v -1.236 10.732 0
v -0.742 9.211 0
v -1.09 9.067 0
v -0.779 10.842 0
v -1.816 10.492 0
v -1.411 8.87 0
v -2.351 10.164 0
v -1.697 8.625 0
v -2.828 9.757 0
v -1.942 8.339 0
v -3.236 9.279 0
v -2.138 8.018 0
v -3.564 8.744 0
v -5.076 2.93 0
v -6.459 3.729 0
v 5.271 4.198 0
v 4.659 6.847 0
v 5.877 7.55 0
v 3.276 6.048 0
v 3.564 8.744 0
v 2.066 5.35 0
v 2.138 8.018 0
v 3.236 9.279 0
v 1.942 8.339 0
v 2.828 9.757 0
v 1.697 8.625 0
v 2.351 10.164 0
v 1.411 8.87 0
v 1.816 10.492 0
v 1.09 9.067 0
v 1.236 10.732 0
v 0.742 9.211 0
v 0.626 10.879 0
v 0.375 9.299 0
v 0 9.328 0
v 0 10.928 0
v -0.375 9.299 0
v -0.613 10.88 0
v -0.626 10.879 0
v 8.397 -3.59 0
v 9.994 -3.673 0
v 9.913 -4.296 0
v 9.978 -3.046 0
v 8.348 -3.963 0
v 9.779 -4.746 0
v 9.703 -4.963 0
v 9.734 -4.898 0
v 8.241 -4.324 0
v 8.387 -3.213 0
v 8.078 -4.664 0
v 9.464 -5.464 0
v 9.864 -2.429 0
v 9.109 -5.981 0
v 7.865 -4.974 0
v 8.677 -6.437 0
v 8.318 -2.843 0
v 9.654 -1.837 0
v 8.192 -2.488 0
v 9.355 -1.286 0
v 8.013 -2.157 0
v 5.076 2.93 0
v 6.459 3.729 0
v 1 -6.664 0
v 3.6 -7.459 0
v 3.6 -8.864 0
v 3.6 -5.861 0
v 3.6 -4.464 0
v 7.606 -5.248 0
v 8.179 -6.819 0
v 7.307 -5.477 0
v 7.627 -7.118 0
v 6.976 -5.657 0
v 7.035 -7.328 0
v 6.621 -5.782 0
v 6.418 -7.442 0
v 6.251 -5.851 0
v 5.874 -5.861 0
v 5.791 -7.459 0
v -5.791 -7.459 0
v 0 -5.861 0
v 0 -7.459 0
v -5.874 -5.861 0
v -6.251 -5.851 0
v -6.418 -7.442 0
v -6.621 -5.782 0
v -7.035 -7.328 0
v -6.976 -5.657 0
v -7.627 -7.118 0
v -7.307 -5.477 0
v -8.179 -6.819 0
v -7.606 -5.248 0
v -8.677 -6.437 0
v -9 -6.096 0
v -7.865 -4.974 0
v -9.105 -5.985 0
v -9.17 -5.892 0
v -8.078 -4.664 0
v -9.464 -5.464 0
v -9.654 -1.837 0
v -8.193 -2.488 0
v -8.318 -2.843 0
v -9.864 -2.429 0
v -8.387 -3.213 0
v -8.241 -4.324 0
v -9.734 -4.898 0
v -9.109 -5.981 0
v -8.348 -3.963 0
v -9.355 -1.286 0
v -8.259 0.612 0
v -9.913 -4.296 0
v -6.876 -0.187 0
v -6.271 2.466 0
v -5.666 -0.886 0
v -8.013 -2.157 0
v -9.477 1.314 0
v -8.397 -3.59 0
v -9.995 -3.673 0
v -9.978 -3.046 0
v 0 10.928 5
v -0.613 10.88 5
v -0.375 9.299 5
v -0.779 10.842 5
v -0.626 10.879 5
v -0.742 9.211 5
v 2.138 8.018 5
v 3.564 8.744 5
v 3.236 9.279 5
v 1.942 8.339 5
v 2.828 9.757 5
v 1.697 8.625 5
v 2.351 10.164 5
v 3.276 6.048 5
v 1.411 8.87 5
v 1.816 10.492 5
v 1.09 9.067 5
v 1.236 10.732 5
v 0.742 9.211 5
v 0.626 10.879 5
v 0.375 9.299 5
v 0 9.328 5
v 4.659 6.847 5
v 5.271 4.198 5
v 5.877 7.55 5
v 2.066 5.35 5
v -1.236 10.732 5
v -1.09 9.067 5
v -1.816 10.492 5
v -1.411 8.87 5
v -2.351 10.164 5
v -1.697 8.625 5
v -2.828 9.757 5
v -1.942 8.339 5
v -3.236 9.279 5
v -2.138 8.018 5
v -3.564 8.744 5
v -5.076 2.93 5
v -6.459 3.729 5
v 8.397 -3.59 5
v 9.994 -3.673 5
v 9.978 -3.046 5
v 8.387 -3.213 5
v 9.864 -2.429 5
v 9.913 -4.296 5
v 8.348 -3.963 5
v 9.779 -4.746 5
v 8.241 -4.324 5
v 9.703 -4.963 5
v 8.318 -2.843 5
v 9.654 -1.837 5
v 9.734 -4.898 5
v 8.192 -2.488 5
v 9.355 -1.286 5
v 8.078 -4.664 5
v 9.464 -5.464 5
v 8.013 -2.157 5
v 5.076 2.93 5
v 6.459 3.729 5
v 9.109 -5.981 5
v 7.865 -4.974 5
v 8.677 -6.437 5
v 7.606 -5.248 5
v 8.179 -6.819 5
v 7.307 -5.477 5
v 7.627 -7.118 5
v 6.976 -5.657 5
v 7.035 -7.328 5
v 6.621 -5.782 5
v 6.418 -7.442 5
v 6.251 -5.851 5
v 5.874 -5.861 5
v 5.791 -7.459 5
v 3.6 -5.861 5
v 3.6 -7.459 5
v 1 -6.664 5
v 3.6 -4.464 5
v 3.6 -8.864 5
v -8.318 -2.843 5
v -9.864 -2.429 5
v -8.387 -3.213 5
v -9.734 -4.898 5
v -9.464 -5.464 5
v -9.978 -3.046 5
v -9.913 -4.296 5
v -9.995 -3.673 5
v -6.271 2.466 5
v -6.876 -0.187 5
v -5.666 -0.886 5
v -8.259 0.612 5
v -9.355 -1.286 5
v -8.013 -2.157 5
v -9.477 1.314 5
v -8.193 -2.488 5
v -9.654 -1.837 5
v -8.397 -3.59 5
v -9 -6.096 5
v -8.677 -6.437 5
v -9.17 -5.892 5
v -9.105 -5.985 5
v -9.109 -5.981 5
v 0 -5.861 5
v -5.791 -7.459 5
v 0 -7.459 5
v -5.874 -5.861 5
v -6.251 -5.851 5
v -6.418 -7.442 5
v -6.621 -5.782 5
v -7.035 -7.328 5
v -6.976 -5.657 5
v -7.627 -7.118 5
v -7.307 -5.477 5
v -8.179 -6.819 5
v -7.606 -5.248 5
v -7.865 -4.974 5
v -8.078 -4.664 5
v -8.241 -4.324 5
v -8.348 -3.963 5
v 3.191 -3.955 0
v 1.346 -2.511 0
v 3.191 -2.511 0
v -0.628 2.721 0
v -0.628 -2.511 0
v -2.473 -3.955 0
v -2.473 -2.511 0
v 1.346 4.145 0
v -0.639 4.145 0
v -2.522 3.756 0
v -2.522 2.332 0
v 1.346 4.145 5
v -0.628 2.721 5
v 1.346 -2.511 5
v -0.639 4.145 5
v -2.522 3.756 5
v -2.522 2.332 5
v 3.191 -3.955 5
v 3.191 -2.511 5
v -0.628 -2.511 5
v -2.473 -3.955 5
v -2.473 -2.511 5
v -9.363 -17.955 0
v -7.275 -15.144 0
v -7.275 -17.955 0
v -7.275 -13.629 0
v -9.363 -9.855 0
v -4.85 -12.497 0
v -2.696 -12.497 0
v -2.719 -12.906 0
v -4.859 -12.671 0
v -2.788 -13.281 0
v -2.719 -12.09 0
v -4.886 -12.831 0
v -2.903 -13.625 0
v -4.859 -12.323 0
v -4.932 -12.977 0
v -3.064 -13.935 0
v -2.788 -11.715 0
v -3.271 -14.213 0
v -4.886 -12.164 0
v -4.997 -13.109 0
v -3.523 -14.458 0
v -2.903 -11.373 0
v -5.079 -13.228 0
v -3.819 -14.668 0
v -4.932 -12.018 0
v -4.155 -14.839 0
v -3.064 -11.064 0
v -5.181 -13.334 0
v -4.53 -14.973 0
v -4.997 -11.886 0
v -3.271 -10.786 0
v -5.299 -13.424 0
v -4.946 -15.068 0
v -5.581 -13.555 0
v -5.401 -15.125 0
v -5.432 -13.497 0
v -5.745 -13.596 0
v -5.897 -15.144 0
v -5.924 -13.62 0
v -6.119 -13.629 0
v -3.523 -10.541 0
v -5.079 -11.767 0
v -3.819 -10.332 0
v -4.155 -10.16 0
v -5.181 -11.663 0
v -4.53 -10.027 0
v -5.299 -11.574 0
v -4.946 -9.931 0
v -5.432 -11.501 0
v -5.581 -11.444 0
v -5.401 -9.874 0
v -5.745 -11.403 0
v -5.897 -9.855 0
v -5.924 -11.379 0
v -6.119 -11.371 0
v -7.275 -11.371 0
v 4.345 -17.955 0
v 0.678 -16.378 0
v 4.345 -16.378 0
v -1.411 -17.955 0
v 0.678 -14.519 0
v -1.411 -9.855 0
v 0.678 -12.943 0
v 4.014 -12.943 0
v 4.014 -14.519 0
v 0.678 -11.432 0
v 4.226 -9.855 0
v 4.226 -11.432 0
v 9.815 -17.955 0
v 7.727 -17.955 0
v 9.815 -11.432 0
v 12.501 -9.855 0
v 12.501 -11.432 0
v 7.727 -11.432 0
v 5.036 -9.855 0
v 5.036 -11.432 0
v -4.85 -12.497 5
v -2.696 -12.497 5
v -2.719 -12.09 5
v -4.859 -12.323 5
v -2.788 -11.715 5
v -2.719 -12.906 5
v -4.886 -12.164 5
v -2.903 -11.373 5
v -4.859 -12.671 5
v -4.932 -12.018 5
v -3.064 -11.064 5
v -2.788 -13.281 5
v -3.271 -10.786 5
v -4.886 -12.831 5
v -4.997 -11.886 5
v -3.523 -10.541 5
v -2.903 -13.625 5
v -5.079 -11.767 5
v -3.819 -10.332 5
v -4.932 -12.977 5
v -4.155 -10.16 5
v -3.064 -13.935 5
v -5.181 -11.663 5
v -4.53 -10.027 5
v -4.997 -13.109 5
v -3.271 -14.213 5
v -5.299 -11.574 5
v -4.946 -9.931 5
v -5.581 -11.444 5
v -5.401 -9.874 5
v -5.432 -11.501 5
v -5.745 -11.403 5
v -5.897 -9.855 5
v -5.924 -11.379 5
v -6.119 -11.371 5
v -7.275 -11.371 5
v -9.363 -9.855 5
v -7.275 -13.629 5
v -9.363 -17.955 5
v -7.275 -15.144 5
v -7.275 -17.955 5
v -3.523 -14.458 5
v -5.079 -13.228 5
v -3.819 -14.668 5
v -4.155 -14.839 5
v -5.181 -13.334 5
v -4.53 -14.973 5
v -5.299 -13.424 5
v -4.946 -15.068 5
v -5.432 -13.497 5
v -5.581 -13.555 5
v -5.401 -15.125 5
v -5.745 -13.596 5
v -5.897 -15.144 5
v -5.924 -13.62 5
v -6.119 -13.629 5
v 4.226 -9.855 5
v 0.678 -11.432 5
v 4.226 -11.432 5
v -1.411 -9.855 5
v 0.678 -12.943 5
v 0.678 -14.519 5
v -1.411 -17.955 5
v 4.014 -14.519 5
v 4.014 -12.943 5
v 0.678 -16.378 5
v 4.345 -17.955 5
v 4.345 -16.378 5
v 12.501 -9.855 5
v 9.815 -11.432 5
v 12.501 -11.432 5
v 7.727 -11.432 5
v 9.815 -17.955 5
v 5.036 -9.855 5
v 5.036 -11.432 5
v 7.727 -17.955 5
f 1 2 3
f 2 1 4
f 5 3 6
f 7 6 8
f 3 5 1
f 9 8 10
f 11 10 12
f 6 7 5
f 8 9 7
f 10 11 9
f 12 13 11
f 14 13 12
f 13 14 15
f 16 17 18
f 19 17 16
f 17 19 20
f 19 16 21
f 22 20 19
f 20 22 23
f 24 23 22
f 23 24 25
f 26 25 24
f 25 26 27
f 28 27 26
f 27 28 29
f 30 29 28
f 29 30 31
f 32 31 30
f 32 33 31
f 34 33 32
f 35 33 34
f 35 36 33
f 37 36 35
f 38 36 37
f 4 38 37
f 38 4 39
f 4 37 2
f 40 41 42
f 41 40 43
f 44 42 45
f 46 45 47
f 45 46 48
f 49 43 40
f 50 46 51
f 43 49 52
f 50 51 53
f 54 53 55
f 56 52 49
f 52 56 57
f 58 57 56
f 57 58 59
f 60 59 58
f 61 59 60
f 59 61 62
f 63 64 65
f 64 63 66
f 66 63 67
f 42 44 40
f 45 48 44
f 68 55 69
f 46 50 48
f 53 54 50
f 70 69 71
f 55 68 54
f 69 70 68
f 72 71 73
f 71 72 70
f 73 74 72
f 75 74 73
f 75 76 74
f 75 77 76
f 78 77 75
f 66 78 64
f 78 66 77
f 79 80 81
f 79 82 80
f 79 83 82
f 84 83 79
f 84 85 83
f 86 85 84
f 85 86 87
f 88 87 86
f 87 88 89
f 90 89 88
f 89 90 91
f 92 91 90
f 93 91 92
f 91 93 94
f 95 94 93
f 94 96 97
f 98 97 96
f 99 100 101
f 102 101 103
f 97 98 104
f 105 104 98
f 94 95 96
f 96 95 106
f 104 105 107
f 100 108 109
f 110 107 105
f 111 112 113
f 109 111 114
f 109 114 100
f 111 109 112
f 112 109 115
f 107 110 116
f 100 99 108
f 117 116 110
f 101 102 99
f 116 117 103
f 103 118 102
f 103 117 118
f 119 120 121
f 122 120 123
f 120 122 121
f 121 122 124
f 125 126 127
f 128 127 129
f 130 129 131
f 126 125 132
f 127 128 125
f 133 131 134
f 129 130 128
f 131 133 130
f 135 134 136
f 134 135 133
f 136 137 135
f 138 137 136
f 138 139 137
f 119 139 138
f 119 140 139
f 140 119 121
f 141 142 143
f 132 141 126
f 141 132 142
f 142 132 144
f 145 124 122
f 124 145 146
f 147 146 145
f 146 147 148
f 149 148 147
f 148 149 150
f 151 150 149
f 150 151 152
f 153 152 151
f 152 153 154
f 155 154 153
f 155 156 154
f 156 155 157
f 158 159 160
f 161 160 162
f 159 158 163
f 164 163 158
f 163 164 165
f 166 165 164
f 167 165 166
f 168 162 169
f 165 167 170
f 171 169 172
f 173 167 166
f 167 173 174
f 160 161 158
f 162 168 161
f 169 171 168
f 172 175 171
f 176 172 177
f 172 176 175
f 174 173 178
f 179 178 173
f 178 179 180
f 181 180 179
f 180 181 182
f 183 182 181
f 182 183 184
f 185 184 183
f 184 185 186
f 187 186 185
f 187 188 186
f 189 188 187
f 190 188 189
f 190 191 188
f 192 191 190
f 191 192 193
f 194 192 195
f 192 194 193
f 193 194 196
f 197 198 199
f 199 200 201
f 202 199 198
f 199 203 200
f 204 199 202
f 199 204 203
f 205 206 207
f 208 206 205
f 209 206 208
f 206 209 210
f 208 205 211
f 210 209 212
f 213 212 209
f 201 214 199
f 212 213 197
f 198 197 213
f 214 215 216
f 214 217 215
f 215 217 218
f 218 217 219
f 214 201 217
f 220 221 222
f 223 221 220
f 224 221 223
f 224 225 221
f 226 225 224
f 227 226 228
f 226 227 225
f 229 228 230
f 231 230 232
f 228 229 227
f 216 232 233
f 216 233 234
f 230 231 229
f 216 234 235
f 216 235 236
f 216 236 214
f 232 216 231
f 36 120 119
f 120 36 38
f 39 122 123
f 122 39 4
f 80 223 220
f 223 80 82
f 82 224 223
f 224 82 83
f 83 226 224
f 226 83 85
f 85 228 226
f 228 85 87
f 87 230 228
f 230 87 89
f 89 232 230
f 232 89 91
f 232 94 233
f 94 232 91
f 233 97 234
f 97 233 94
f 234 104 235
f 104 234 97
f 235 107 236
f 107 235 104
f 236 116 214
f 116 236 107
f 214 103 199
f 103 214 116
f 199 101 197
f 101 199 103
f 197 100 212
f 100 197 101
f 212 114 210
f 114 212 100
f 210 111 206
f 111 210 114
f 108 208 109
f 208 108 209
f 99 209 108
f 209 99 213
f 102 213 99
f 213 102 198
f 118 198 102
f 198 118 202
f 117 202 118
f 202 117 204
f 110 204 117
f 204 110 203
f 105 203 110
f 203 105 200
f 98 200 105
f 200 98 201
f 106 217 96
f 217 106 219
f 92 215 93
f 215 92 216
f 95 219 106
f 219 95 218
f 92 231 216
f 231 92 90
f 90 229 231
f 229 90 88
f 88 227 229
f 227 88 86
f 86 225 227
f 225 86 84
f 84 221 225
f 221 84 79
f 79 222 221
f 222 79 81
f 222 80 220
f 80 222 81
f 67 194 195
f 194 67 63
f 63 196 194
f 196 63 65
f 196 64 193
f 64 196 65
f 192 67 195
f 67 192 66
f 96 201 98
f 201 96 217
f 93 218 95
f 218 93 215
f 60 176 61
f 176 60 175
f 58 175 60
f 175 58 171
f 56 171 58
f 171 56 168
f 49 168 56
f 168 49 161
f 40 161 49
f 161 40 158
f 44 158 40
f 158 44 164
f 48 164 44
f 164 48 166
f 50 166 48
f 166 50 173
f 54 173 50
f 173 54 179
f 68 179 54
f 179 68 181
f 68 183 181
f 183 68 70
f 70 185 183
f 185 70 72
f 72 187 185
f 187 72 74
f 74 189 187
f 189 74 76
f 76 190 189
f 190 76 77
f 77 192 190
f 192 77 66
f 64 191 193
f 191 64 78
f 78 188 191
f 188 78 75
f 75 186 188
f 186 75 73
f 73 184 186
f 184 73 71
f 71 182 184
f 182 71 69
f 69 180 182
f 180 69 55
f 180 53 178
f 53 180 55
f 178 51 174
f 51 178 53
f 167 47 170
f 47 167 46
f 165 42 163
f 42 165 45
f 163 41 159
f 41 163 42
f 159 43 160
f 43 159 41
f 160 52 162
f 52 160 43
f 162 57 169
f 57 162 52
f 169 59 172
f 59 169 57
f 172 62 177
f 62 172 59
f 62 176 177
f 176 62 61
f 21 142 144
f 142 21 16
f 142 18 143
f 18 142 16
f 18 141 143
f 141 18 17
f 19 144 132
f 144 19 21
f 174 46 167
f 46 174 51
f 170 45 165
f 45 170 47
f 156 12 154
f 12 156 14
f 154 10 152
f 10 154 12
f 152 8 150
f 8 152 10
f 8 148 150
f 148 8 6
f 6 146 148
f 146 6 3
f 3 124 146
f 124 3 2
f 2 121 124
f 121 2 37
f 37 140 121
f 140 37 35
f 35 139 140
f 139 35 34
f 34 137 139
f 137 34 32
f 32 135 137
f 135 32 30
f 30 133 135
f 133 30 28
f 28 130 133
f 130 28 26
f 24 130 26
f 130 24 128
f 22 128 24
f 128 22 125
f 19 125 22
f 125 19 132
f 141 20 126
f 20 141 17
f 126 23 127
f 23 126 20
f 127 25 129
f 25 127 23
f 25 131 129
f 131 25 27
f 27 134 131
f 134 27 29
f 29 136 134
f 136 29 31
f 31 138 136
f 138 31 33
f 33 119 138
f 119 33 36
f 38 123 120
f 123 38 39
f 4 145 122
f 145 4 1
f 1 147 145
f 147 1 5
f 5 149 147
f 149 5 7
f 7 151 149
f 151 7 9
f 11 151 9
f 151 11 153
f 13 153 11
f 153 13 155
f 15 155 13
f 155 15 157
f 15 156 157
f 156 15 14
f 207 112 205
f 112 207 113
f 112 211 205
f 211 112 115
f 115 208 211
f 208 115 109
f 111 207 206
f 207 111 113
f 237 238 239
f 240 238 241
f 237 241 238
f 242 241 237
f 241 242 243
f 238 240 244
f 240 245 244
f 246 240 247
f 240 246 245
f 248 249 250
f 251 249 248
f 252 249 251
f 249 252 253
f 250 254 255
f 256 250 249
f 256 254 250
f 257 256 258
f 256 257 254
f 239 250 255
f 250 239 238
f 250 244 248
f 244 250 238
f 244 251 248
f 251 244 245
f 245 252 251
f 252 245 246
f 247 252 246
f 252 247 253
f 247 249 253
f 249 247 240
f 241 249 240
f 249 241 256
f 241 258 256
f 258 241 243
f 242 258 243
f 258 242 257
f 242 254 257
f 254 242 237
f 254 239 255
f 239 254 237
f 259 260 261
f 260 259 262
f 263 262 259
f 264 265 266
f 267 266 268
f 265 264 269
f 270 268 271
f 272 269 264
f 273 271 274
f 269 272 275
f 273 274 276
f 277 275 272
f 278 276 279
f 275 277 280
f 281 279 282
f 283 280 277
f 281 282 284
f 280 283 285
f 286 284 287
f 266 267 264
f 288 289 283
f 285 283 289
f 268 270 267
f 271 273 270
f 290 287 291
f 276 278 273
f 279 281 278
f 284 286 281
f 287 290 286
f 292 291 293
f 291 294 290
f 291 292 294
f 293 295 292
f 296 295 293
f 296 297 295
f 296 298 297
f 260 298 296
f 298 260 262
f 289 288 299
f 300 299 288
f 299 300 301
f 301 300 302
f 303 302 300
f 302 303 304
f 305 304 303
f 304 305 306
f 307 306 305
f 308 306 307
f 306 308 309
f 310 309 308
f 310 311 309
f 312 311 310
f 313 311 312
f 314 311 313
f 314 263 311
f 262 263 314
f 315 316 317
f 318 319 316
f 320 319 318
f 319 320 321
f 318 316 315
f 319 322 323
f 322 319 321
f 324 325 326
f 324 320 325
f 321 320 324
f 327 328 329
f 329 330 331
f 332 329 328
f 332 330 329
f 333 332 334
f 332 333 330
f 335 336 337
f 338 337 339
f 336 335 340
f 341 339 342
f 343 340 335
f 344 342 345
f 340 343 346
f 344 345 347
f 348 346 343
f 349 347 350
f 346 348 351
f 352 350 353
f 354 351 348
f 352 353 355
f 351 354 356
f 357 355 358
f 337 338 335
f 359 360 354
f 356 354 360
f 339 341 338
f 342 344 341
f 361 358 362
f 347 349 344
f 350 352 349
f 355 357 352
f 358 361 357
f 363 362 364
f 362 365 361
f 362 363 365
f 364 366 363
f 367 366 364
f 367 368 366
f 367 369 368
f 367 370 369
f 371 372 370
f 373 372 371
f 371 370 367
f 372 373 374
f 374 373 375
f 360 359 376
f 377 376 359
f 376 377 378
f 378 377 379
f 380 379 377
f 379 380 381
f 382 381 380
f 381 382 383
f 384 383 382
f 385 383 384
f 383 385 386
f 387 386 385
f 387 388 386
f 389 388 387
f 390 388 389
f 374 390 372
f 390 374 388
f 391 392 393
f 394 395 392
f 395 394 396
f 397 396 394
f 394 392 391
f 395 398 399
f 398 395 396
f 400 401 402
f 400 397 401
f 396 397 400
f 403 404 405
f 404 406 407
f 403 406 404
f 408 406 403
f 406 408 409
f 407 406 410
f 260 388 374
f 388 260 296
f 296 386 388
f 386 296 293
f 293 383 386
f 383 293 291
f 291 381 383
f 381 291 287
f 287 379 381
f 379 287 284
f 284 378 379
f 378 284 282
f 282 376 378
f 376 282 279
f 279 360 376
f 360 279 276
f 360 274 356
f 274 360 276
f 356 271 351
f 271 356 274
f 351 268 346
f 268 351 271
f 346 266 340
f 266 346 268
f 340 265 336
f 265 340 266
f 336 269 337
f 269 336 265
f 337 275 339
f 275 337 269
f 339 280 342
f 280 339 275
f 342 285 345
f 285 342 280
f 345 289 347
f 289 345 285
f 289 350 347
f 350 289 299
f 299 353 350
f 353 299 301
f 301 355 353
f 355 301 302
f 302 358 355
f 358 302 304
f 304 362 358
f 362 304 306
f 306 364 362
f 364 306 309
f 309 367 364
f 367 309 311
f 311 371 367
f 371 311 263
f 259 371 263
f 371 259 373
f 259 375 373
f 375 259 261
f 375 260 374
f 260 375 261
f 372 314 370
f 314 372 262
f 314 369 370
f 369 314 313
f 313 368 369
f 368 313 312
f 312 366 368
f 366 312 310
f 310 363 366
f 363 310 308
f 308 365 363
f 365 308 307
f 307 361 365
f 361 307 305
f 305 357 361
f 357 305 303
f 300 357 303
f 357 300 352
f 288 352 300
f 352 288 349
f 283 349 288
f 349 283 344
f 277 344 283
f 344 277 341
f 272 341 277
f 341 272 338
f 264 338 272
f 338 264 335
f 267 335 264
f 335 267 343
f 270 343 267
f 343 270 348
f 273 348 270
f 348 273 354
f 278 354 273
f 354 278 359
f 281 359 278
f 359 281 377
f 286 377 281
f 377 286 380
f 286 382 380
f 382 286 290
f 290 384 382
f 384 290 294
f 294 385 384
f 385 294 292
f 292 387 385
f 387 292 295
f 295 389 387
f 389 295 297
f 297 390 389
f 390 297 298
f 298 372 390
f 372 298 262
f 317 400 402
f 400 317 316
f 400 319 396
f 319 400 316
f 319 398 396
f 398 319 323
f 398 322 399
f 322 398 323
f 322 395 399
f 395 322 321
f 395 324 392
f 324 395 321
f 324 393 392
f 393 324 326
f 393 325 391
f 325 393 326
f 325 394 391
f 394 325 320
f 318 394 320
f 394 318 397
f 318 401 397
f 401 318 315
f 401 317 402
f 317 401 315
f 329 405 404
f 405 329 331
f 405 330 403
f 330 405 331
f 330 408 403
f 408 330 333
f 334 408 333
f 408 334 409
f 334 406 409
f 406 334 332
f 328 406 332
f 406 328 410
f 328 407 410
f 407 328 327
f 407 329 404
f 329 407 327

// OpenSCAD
//https://www.thingiverse.com/thing:216963
//LICENSE: GPL
// Updated by Brian Alano, 2023
/*parameters*/
// preview[view:south, tilt:top diagonal]
/* [Global] */
// Demo mode
demo=0; //[0:No,1:Yes]
// Material type
type="ABS"; //[ABS,PLA,PS,PP,OTHER]
// Width of the symbol
size=20; //[1:50]
// Thickness of the symbol
T=5; //[1:10]
/* [Hidden] */
//use <write/Write.scad>
//
//if(demo)
//color("SteelBlue")
//{
//	recycling_symbol("ABS", 30, 2, [-25,45,0]);
//	recycling_symbol("PLA", 30, 2, [25,45,0]);
//	recycling_symbol("PP", 20, 2, [-35,0,0]);
//	recycling_symbol("PS", 20, 2, [0,0,0]);
//	recycling_symbol("OTHER", 20, 2, [35,0,0]);
//}
//else
	color("SteelBlue") recycling_symbol("PET", size, T, number = 1, $fn=40);


module recycling_symbol(type="ABS", size=10, h=1, pos=[0,0,0], rot=[0,0,0],number, $fn=40)
{
     code = is_num(number) ? str(number) : (type=="ABS"?"9":type=="PS"?"6":type=="PP"?"5":"PET"?"1":"7");
    
	translate(pos) rotate(rot)
	scale([size/10,size/10,h])
	union()
	{
		for(i=[0,120,240])
			rotate(a=[0,0,i])
			__r_s_arrow(h=1);
		translate([0,0,0])
//			write(code, t=1, h=4, center=true);
            linear_extrude(1) text(code, size=4, valign="center", halign="center", font="Lucida Sans Typewriter:style=Bold");
		translate([0.5,-7,0])
//			write(type, t=1, h=4, space=1.2, center=true);
            linear_extrude(1) text(type, size=4, valign="center", halign="center", font="Lucida Sans Typewriter:style=Bold");
	}
}

module __r_s_arrow(h)
{
	width=0.8;
	y=sqrt(3)/3*6;
	arr_y=-y/2-2+width/2;
	linear_extrude(height=h)
	union()
	{
		difference()
		{
			__r_s_rounded_triangle(y,2);
			__r_s_rounded_triangle(y,2-width);
			translate([0,-5,0])
				square([6,12]);
			rotate([0,0,60])
			translate([-1.5,0,0])
				square([6,7]);
		}
		polygon(points=[[0.5,arr_y],[1.8,arr_y-1.1],[1.8,arr_y+1.1]]);
	}
}

module __r_s_rounded_triangle(y,r)
{
	hull()
	for(i=[0,120,240])
		rotate(a=[0,0,i])
		translate([0,y,0])
			circle(r=r);
}
